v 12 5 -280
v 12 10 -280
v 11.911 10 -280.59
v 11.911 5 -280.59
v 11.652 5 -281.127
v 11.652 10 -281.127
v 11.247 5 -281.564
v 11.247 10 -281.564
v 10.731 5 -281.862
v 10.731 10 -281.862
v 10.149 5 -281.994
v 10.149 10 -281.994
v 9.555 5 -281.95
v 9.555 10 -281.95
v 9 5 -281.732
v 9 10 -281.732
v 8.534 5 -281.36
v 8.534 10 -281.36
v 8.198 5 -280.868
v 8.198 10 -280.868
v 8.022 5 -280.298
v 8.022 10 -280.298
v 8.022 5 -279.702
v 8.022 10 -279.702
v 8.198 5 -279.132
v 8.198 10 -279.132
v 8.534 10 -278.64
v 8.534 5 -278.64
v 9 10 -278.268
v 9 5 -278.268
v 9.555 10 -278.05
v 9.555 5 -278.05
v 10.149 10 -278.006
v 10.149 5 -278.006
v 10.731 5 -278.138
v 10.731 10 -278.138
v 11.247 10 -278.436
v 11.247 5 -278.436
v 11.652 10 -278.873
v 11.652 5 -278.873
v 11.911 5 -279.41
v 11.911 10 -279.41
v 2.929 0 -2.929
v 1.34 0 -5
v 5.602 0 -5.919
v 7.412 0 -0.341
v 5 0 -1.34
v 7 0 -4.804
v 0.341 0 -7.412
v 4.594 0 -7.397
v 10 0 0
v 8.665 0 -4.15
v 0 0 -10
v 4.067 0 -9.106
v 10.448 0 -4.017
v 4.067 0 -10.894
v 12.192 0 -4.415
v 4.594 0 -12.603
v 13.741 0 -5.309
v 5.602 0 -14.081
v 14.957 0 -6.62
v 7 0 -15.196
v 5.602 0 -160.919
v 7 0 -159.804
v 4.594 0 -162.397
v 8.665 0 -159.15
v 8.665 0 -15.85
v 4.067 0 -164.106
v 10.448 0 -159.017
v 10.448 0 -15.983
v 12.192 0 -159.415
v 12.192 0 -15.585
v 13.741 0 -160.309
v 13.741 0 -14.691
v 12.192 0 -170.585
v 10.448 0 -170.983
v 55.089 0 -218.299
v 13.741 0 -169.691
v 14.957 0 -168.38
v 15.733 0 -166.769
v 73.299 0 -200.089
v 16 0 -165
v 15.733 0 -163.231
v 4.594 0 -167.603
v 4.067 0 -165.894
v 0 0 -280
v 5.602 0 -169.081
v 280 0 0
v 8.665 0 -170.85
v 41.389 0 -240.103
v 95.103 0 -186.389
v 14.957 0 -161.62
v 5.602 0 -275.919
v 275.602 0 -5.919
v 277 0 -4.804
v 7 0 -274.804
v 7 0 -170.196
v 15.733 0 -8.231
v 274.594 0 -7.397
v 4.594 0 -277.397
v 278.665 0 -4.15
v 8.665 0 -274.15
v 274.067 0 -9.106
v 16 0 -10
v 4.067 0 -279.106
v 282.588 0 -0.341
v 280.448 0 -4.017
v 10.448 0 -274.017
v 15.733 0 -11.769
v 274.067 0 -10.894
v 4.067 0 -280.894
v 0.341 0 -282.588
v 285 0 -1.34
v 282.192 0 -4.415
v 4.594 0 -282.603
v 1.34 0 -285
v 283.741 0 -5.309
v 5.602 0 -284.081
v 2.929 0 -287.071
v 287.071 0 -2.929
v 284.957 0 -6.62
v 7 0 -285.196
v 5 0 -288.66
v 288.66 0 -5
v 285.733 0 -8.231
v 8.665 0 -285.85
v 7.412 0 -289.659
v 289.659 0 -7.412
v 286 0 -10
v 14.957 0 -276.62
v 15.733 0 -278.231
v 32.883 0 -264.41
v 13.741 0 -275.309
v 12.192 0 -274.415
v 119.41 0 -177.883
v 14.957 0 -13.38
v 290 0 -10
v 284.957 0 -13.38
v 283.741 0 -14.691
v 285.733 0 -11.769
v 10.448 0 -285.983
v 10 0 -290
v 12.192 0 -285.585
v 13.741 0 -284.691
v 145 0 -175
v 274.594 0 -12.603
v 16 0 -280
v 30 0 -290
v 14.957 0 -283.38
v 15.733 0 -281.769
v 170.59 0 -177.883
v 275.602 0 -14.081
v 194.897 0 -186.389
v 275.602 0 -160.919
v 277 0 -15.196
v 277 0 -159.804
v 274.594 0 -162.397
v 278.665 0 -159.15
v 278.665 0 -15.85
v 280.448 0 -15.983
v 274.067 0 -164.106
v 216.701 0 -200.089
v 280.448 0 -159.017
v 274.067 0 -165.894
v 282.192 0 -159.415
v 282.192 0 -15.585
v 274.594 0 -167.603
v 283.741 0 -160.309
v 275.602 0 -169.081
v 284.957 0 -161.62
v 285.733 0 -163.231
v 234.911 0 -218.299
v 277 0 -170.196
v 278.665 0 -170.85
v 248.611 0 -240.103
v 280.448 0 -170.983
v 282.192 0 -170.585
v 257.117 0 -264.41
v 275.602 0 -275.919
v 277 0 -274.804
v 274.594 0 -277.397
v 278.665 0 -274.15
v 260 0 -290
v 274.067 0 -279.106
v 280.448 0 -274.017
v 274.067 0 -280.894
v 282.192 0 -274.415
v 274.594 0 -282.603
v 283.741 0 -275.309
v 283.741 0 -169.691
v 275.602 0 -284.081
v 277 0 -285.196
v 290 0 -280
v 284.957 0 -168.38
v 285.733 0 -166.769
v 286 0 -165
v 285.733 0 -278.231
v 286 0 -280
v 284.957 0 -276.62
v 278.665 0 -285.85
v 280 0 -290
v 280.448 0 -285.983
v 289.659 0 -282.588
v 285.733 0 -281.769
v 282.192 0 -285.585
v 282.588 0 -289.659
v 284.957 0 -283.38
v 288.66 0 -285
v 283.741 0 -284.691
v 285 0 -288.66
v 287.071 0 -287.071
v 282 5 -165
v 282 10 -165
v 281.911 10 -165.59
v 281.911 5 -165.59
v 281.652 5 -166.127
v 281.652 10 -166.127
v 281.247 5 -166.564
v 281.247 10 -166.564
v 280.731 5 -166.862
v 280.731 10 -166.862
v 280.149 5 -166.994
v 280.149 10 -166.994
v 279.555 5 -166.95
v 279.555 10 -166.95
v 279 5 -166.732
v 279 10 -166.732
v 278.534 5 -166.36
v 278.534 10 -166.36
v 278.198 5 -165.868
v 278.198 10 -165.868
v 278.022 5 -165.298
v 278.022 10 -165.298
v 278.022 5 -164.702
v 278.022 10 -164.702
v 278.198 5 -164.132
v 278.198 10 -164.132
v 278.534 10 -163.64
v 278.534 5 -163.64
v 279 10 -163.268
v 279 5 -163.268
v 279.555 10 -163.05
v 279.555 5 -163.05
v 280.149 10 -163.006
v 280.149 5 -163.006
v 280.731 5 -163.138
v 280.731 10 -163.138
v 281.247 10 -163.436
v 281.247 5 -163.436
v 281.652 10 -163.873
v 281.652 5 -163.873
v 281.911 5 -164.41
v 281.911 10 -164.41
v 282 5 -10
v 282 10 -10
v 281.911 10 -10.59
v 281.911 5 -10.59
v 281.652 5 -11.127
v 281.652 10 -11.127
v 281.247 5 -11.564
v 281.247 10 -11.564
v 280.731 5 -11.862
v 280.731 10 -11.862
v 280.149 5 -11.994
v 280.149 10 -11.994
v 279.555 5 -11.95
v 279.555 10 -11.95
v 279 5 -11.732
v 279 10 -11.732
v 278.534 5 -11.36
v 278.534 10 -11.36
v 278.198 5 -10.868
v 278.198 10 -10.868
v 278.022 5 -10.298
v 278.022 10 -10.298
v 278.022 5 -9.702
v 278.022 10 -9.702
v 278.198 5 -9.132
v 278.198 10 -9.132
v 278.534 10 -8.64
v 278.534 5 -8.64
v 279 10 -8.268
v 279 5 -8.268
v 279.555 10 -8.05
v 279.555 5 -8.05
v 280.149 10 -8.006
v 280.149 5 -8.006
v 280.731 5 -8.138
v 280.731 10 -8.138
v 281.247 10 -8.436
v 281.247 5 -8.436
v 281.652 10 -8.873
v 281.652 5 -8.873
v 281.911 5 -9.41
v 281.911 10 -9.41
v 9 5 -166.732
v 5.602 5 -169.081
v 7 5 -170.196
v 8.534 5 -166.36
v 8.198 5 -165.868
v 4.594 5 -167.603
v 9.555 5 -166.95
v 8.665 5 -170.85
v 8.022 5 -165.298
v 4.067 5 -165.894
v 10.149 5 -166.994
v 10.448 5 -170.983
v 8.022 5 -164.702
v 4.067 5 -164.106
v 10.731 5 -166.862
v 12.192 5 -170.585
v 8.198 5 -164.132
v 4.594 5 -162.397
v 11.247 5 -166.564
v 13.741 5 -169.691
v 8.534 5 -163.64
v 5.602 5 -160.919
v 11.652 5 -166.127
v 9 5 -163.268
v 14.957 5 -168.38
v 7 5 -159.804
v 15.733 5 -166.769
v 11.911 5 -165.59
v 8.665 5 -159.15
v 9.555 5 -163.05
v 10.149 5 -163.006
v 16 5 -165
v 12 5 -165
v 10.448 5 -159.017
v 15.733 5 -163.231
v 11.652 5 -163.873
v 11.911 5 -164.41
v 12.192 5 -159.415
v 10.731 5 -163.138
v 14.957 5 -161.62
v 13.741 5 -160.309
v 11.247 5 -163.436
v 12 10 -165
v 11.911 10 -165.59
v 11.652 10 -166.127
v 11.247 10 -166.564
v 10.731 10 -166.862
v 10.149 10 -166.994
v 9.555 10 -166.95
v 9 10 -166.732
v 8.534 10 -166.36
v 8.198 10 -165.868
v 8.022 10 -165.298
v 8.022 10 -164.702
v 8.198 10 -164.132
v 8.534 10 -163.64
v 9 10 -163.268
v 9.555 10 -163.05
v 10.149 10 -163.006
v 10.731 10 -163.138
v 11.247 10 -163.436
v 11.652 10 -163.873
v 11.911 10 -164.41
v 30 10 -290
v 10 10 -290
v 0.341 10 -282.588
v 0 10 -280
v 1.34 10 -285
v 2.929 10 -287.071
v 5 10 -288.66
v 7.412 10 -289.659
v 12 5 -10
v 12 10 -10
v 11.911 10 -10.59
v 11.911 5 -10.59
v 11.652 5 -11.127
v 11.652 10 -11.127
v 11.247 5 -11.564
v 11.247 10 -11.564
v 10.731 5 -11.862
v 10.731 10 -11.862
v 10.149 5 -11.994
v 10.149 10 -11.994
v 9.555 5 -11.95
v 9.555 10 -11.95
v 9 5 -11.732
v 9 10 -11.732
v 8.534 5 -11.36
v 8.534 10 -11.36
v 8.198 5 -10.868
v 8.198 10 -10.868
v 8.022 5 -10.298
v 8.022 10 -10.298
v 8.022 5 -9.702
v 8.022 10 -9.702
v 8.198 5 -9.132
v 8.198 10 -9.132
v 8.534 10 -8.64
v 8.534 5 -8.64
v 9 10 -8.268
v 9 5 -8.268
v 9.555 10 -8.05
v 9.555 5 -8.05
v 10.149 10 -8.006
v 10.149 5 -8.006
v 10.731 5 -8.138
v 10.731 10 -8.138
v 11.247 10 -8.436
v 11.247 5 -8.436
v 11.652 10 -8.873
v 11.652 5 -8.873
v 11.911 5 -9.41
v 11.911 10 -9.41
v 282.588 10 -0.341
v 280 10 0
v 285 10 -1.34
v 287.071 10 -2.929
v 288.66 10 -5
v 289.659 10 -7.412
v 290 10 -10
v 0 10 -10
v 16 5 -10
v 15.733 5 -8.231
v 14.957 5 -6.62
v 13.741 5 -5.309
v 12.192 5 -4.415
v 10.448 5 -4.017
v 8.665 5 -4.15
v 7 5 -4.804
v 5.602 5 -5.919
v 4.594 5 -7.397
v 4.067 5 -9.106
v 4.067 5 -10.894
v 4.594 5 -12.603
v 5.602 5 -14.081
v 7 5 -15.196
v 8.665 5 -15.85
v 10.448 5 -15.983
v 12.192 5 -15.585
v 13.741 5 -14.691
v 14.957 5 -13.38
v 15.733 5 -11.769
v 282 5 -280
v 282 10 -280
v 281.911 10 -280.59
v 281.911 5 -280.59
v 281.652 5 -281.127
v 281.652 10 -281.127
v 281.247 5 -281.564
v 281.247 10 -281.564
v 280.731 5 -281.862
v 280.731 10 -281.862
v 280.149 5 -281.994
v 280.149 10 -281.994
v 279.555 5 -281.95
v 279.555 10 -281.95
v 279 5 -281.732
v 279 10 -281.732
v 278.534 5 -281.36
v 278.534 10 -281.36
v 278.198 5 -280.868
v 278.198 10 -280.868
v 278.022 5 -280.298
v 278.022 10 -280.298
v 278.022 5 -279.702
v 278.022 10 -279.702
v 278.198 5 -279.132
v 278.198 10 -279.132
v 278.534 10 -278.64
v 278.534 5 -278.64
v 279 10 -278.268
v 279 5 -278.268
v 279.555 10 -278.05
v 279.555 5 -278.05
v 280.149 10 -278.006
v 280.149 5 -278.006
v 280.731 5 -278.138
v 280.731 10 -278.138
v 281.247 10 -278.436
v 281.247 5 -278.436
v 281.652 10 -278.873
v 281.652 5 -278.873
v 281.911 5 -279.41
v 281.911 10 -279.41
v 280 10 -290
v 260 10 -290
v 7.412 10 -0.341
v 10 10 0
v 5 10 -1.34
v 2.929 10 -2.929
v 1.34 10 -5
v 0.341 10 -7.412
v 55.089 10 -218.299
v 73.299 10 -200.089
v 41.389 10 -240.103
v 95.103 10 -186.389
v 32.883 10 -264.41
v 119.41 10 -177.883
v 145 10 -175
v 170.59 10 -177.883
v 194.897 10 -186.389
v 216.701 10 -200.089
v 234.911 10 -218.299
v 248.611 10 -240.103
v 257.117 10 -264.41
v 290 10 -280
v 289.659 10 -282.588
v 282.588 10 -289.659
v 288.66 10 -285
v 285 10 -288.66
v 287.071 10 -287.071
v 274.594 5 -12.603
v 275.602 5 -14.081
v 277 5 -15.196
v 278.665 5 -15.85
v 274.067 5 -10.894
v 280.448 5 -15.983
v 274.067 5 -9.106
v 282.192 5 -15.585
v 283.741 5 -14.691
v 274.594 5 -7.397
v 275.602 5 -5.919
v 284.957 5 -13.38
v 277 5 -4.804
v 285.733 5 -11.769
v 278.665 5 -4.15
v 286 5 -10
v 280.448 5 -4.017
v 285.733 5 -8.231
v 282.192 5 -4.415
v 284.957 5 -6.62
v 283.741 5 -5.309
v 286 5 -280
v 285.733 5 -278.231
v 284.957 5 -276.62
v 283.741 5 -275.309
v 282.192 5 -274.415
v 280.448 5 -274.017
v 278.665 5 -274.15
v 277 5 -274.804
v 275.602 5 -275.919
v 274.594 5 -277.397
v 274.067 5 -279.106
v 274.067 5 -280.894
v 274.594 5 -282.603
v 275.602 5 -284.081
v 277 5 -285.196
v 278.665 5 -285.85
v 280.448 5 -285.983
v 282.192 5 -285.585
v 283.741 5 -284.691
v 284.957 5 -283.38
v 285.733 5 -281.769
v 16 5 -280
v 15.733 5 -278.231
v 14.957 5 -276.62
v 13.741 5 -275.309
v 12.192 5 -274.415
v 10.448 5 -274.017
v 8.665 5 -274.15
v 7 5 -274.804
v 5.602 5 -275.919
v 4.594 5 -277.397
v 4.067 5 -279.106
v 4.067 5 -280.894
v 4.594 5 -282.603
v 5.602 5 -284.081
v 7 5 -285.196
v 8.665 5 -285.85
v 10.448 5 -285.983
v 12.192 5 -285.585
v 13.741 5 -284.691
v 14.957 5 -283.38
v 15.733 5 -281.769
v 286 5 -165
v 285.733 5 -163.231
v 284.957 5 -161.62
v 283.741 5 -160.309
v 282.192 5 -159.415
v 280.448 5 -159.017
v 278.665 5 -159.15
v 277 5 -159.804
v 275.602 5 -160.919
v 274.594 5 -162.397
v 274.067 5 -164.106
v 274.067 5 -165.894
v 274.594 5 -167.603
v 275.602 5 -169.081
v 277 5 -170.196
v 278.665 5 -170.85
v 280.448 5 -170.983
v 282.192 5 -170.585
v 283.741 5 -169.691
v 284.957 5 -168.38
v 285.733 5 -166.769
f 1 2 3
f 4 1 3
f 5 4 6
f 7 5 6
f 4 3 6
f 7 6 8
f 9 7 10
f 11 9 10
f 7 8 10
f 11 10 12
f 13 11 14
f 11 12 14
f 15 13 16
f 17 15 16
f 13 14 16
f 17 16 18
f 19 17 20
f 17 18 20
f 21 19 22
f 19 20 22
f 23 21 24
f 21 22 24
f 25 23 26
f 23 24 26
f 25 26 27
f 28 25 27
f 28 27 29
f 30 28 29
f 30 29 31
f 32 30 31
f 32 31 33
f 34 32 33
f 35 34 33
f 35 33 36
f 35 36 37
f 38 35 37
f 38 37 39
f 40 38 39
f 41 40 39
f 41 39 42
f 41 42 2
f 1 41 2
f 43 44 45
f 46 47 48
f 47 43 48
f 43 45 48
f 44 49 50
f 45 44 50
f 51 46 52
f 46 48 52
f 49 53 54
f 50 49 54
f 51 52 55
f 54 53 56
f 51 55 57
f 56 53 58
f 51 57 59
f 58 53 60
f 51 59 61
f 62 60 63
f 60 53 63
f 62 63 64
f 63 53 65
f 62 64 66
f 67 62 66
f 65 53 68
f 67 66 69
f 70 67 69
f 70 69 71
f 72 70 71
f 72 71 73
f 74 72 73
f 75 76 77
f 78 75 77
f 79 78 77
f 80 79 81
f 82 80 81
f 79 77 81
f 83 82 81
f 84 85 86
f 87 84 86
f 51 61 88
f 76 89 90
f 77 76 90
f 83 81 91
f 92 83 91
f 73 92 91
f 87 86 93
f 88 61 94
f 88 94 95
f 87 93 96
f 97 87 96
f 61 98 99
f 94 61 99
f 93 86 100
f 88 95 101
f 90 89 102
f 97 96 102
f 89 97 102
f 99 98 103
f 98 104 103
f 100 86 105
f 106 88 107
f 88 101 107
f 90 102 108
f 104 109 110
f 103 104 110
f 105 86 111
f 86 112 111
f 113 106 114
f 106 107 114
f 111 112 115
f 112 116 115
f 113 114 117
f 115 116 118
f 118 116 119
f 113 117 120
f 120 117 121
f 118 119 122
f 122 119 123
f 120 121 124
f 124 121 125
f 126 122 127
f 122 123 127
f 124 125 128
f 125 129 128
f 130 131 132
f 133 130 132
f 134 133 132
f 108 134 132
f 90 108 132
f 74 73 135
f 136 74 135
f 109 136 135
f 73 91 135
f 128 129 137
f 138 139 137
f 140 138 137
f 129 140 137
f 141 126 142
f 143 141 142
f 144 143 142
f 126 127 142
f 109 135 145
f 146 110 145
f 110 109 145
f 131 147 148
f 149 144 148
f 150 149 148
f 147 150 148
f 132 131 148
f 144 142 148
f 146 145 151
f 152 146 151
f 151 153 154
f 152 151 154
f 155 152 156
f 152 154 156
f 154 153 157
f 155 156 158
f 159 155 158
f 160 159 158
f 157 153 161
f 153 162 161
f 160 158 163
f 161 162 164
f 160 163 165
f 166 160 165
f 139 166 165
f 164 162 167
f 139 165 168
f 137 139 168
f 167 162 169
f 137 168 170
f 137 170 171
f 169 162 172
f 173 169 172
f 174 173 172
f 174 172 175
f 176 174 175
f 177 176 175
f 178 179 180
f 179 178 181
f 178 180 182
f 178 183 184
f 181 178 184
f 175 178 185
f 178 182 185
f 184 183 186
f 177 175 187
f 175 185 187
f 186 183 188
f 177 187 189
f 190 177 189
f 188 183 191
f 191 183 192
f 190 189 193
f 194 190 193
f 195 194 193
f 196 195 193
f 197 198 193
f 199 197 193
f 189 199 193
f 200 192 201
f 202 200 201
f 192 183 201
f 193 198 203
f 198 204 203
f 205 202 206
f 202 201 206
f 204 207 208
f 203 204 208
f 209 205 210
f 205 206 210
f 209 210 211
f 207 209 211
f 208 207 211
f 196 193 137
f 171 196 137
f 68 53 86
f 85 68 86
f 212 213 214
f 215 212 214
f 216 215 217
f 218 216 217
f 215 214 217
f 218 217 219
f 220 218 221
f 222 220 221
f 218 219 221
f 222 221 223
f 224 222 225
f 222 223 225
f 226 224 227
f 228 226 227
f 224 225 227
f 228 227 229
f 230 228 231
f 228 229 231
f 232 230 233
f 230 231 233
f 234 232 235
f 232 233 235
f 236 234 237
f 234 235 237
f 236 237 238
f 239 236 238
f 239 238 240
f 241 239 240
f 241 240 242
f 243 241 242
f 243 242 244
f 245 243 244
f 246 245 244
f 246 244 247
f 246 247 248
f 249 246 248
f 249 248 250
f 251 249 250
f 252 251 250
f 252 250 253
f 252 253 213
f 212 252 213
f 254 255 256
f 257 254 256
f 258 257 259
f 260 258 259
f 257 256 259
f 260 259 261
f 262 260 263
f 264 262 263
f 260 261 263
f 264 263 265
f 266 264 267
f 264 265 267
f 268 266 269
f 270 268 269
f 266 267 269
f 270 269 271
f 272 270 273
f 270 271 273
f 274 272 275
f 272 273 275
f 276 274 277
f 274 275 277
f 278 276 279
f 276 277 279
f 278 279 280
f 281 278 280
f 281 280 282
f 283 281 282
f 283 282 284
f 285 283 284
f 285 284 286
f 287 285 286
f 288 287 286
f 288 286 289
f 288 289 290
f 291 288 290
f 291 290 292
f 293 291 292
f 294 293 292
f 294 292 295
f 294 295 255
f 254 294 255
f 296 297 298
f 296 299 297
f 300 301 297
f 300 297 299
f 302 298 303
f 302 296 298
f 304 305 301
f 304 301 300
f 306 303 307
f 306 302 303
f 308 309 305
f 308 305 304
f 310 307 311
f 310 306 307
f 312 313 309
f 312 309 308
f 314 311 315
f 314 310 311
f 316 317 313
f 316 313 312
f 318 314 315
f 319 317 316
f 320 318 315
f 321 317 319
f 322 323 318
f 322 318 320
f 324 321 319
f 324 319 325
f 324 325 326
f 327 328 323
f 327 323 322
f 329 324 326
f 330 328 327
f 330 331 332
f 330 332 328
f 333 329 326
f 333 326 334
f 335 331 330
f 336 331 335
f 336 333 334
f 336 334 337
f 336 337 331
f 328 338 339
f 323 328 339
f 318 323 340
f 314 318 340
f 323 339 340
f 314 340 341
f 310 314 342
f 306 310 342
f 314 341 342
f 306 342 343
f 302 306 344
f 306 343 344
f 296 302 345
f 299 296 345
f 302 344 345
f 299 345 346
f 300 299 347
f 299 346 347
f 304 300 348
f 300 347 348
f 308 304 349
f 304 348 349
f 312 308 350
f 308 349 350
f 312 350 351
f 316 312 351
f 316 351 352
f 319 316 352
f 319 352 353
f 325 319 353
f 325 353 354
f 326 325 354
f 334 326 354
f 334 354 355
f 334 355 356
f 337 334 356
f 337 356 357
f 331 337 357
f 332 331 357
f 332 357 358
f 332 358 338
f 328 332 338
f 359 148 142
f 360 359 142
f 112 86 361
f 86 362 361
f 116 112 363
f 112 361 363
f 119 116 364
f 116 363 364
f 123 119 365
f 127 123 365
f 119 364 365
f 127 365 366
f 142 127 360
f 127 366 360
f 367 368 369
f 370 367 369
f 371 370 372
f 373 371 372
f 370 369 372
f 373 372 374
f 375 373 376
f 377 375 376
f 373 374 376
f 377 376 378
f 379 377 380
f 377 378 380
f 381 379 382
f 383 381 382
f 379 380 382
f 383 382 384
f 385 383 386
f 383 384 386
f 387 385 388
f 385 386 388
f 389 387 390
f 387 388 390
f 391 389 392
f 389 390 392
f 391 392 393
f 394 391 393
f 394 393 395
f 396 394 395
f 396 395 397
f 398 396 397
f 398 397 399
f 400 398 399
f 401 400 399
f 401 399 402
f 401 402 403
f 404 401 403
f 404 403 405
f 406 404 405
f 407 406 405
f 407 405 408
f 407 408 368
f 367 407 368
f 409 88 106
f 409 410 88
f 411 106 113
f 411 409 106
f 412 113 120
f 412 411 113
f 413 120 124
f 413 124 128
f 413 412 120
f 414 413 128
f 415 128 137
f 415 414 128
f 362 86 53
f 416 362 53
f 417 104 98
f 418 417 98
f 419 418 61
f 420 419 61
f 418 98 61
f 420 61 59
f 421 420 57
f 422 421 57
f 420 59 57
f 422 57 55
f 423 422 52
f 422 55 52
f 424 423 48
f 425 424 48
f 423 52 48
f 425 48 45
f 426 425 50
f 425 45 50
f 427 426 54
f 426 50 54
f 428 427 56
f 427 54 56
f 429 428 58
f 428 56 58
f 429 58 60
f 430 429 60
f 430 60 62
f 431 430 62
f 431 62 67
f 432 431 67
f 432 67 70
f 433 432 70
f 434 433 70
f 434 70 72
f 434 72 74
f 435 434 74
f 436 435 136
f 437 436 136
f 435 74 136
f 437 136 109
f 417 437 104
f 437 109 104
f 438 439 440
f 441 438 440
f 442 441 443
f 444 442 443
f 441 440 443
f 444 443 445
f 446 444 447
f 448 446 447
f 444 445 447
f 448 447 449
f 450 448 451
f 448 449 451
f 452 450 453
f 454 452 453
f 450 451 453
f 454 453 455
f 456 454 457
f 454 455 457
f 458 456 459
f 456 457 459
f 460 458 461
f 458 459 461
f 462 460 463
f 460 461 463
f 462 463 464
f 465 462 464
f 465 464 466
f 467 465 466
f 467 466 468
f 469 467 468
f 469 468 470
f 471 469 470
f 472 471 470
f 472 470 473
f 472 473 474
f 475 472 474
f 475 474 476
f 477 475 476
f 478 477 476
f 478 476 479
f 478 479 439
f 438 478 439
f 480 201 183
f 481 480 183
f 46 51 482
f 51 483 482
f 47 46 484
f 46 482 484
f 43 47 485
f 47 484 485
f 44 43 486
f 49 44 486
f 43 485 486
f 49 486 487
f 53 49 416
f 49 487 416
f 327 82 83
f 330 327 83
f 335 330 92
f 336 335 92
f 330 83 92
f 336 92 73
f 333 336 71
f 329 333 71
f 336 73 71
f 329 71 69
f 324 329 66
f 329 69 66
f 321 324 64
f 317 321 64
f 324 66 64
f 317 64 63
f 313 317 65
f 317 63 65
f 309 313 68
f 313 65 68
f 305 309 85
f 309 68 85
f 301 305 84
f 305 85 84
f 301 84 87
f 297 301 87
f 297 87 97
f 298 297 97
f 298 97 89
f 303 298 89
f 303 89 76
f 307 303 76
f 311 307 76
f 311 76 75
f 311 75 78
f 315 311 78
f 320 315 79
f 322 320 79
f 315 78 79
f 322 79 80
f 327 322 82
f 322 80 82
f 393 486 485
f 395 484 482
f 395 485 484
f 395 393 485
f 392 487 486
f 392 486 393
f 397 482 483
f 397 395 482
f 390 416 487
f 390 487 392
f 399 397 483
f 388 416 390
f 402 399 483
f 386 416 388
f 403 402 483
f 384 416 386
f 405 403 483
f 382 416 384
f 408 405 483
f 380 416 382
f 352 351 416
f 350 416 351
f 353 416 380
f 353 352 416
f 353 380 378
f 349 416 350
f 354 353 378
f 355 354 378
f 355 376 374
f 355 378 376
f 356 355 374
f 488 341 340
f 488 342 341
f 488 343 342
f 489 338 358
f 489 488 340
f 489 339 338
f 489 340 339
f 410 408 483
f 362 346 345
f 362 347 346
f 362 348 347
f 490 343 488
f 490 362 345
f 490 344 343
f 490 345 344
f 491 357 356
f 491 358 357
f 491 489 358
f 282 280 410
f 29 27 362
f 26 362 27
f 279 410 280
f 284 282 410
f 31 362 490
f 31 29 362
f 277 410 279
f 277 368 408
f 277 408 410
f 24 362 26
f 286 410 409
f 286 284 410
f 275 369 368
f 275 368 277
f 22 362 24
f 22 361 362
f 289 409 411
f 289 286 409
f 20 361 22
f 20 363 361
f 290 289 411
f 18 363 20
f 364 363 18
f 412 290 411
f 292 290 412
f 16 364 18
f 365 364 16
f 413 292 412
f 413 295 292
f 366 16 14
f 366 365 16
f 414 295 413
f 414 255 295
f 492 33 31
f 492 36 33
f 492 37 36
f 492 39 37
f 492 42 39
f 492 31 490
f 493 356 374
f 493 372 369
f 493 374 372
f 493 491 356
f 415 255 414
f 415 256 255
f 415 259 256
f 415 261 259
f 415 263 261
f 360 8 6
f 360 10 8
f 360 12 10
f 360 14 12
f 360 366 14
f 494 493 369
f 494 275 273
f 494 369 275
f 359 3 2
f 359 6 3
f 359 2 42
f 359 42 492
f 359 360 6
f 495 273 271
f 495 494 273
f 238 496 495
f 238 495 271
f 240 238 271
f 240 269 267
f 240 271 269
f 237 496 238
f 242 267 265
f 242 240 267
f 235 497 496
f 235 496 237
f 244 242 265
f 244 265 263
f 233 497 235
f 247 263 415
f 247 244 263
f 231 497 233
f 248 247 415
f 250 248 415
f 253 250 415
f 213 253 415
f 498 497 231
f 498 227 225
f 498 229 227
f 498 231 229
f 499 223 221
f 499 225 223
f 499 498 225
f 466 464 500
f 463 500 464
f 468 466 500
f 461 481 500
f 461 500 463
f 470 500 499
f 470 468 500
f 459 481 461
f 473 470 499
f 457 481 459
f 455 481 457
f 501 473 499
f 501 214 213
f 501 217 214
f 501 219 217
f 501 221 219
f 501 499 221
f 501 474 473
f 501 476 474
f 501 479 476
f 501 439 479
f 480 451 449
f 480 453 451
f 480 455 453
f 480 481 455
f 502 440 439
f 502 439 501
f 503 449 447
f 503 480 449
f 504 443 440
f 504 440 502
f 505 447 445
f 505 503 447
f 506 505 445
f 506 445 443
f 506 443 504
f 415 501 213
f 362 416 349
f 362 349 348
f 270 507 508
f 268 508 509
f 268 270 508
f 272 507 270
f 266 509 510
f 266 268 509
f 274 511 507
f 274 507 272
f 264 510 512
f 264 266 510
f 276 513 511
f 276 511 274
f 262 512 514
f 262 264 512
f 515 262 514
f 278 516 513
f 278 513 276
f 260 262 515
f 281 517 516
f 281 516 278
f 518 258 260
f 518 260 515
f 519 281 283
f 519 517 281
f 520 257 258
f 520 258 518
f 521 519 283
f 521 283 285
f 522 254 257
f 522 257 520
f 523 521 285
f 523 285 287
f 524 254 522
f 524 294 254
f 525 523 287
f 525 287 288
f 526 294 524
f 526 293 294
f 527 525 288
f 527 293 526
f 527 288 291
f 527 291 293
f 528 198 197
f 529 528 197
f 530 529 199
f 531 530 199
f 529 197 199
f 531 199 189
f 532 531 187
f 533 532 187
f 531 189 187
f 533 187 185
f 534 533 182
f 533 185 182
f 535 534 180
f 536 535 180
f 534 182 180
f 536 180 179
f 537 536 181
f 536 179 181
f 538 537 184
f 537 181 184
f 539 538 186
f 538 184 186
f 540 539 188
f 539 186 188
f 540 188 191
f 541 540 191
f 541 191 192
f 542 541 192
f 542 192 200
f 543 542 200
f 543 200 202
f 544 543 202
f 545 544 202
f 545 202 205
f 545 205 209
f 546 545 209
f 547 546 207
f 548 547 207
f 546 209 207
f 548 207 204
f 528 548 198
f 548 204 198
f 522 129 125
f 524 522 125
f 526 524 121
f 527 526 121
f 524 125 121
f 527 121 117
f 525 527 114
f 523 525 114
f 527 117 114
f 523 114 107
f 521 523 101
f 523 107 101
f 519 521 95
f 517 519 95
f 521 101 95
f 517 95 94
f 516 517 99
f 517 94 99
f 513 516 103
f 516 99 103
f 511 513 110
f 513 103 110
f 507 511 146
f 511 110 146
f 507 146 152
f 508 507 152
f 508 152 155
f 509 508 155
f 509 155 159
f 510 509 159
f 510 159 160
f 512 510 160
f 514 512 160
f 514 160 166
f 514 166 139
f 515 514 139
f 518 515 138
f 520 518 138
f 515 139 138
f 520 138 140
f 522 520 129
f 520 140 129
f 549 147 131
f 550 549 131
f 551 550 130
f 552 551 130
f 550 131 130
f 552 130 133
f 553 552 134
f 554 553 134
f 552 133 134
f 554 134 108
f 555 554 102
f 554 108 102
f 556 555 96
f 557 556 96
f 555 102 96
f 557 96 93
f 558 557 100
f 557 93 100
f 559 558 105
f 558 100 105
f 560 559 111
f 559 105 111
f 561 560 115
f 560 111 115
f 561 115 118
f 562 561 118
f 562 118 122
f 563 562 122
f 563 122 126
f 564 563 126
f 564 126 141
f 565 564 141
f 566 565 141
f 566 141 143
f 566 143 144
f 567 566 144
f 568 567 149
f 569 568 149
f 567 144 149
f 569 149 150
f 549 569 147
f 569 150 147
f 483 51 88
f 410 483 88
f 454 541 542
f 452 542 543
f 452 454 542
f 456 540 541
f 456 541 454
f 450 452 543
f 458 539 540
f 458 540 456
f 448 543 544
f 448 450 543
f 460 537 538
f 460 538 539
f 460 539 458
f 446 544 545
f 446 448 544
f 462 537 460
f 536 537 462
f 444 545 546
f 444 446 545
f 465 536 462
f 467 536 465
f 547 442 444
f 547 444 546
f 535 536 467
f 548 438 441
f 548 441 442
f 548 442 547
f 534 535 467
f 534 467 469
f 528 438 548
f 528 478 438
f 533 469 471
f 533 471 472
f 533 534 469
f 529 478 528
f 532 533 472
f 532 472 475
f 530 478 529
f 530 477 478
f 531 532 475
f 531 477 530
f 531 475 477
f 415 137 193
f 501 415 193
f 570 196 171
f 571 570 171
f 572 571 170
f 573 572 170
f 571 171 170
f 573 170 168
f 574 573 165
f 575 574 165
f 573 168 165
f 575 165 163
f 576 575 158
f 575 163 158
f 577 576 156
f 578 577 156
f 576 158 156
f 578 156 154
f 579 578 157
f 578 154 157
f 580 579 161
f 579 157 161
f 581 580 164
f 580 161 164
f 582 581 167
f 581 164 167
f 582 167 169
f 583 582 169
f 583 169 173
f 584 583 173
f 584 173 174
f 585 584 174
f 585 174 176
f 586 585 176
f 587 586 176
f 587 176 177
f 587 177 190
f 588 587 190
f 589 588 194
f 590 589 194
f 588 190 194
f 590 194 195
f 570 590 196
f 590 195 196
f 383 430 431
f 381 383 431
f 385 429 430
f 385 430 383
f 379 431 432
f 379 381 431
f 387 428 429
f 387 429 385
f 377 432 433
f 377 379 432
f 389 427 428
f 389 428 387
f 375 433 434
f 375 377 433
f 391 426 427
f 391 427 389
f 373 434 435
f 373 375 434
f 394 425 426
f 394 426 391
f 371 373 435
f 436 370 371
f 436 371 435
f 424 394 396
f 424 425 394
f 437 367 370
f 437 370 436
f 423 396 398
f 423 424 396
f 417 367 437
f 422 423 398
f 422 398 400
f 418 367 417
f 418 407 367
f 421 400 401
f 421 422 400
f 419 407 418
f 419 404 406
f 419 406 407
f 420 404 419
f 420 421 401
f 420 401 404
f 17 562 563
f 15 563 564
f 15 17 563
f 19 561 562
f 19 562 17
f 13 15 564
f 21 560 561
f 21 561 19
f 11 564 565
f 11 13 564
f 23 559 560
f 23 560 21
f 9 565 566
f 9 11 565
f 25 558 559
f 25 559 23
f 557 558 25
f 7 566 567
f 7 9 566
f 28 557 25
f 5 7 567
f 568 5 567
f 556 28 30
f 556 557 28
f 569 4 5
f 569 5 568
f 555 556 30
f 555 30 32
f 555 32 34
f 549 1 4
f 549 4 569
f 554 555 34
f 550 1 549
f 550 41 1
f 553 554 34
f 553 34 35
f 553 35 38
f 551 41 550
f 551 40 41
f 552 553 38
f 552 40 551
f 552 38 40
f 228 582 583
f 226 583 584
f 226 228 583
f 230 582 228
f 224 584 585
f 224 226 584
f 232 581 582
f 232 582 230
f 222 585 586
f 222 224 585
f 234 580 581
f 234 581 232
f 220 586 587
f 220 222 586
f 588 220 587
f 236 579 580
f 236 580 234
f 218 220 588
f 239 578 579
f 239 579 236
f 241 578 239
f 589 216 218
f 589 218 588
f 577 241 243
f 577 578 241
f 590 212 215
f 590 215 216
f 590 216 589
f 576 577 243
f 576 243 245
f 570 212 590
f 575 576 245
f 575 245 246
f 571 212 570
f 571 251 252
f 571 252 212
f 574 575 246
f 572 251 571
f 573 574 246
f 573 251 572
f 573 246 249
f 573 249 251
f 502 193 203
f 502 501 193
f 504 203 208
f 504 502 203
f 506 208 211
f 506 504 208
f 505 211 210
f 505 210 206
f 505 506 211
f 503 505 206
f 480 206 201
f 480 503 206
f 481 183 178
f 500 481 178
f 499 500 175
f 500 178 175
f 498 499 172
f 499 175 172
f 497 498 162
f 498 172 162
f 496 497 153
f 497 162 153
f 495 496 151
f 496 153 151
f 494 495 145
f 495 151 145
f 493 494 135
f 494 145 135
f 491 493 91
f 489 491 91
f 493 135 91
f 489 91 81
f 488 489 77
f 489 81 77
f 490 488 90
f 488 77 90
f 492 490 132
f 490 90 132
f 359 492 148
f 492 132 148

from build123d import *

# Parameters (mm, degrees)
BOSS_EXTRU_1_DEPTH      = 10
ESQUISSE3_R             = 2
ENL_V_MAT_EXTRU_1_DEPTH = 10
CONG_1_R                = 10
ESQUISSE4_R             = 2
ENL_V_MAT_EXTRU_2_DEPTH = 10
ESQUISSE6_R             = 6
ENL_V_MAT_EXTRU_4_DEPTH = 5


with BuildPart() as part:
    # Esquisse2 → Boss.-Extru.1 (new body)
    with BuildSketch(Plane(origin=(0, 0, 0), x_dir=(1, 0, 0), z_dir=(0, 1, 0))):
        with BuildLine():
            Line((0, 0), (290, 0))
            Line((290, 0), (290, 290))
            Line((290, 290), (260, 290))
            ThreePointArc((260, 290), (145, 175), (30, 290))
            Line((30, 290), (0, 290))
            Line((0, 290), (0, 0))
        make_face()
    extrude(amount=BOSS_EXTRU_1_DEPTH)

    # Esquisse3 → Enlèv. mat.-Extru.1 (cut)
    with BuildSketch(Plane(origin=(0, 10, 0), x_dir=(1, 0, 0), z_dir=(0, 1, 0))):
        with Locations((10, 280)):
            Circle(ESQUISSE3_R)
        with Locations((280, 280)):
            Circle(ESQUISSE3_R)
        with Locations((280, 10)):
            Circle(ESQUISSE3_R)
        with Locations((10, 10)):
            Circle(ESQUISSE3_R)
    extrude(amount=-ENL_V_MAT_EXTRU_1_DEPTH, mode=Mode.SUBTRACT)

    # Congé1
    cong_1_edges = [part.edges().sort_by_distance(p)[0] for p in [
        (0, 5, -290),
        (290, 5, -290),
        (290, 5, 0),
        (0, 5, 0),
    ]]
    fillet(cong_1_edges, radius=CONG_1_R)

    # Esquisse4 → Enlèv. mat.-Extru.2 (cut)
    with BuildSketch(Plane(origin=(0, 10, 0), x_dir=(1, 0, 0), z_dir=(0, 1, 0))):
        with Locations((10, 165)):
            Circle(ESQUISSE4_R)
        with Locations((280, 165)):
            Circle(ESQUISSE4_R)
    extrude(amount=-ENL_V_MAT_EXTRU_2_DEPTH, mode=Mode.SUBTRACT)

    # Esquisse6 → Enlèv. mat.-Extru.4 (cut)
    with BuildSketch(Plane.XZ):
        with Locations((10, -10)):
            Circle(ESQUISSE6_R)
        with Locations((280, -10)):
            Circle(ESQUISSE6_R)
        with Locations((280, -165)):
            Circle(ESQUISSE6_R)
        with Locations((280, -280)):
            Circle(ESQUISSE6_R)
        with Locations((10, -280)):
            Circle(ESQUISSE6_R)
        with Locations((10, -165)):
            Circle(ESQUISSE6_R)
    extrude(amount=-ENL_V_MAT_EXTRU_4_DEPTH, mode=Mode.SUBTRACT)


solid = part.part
